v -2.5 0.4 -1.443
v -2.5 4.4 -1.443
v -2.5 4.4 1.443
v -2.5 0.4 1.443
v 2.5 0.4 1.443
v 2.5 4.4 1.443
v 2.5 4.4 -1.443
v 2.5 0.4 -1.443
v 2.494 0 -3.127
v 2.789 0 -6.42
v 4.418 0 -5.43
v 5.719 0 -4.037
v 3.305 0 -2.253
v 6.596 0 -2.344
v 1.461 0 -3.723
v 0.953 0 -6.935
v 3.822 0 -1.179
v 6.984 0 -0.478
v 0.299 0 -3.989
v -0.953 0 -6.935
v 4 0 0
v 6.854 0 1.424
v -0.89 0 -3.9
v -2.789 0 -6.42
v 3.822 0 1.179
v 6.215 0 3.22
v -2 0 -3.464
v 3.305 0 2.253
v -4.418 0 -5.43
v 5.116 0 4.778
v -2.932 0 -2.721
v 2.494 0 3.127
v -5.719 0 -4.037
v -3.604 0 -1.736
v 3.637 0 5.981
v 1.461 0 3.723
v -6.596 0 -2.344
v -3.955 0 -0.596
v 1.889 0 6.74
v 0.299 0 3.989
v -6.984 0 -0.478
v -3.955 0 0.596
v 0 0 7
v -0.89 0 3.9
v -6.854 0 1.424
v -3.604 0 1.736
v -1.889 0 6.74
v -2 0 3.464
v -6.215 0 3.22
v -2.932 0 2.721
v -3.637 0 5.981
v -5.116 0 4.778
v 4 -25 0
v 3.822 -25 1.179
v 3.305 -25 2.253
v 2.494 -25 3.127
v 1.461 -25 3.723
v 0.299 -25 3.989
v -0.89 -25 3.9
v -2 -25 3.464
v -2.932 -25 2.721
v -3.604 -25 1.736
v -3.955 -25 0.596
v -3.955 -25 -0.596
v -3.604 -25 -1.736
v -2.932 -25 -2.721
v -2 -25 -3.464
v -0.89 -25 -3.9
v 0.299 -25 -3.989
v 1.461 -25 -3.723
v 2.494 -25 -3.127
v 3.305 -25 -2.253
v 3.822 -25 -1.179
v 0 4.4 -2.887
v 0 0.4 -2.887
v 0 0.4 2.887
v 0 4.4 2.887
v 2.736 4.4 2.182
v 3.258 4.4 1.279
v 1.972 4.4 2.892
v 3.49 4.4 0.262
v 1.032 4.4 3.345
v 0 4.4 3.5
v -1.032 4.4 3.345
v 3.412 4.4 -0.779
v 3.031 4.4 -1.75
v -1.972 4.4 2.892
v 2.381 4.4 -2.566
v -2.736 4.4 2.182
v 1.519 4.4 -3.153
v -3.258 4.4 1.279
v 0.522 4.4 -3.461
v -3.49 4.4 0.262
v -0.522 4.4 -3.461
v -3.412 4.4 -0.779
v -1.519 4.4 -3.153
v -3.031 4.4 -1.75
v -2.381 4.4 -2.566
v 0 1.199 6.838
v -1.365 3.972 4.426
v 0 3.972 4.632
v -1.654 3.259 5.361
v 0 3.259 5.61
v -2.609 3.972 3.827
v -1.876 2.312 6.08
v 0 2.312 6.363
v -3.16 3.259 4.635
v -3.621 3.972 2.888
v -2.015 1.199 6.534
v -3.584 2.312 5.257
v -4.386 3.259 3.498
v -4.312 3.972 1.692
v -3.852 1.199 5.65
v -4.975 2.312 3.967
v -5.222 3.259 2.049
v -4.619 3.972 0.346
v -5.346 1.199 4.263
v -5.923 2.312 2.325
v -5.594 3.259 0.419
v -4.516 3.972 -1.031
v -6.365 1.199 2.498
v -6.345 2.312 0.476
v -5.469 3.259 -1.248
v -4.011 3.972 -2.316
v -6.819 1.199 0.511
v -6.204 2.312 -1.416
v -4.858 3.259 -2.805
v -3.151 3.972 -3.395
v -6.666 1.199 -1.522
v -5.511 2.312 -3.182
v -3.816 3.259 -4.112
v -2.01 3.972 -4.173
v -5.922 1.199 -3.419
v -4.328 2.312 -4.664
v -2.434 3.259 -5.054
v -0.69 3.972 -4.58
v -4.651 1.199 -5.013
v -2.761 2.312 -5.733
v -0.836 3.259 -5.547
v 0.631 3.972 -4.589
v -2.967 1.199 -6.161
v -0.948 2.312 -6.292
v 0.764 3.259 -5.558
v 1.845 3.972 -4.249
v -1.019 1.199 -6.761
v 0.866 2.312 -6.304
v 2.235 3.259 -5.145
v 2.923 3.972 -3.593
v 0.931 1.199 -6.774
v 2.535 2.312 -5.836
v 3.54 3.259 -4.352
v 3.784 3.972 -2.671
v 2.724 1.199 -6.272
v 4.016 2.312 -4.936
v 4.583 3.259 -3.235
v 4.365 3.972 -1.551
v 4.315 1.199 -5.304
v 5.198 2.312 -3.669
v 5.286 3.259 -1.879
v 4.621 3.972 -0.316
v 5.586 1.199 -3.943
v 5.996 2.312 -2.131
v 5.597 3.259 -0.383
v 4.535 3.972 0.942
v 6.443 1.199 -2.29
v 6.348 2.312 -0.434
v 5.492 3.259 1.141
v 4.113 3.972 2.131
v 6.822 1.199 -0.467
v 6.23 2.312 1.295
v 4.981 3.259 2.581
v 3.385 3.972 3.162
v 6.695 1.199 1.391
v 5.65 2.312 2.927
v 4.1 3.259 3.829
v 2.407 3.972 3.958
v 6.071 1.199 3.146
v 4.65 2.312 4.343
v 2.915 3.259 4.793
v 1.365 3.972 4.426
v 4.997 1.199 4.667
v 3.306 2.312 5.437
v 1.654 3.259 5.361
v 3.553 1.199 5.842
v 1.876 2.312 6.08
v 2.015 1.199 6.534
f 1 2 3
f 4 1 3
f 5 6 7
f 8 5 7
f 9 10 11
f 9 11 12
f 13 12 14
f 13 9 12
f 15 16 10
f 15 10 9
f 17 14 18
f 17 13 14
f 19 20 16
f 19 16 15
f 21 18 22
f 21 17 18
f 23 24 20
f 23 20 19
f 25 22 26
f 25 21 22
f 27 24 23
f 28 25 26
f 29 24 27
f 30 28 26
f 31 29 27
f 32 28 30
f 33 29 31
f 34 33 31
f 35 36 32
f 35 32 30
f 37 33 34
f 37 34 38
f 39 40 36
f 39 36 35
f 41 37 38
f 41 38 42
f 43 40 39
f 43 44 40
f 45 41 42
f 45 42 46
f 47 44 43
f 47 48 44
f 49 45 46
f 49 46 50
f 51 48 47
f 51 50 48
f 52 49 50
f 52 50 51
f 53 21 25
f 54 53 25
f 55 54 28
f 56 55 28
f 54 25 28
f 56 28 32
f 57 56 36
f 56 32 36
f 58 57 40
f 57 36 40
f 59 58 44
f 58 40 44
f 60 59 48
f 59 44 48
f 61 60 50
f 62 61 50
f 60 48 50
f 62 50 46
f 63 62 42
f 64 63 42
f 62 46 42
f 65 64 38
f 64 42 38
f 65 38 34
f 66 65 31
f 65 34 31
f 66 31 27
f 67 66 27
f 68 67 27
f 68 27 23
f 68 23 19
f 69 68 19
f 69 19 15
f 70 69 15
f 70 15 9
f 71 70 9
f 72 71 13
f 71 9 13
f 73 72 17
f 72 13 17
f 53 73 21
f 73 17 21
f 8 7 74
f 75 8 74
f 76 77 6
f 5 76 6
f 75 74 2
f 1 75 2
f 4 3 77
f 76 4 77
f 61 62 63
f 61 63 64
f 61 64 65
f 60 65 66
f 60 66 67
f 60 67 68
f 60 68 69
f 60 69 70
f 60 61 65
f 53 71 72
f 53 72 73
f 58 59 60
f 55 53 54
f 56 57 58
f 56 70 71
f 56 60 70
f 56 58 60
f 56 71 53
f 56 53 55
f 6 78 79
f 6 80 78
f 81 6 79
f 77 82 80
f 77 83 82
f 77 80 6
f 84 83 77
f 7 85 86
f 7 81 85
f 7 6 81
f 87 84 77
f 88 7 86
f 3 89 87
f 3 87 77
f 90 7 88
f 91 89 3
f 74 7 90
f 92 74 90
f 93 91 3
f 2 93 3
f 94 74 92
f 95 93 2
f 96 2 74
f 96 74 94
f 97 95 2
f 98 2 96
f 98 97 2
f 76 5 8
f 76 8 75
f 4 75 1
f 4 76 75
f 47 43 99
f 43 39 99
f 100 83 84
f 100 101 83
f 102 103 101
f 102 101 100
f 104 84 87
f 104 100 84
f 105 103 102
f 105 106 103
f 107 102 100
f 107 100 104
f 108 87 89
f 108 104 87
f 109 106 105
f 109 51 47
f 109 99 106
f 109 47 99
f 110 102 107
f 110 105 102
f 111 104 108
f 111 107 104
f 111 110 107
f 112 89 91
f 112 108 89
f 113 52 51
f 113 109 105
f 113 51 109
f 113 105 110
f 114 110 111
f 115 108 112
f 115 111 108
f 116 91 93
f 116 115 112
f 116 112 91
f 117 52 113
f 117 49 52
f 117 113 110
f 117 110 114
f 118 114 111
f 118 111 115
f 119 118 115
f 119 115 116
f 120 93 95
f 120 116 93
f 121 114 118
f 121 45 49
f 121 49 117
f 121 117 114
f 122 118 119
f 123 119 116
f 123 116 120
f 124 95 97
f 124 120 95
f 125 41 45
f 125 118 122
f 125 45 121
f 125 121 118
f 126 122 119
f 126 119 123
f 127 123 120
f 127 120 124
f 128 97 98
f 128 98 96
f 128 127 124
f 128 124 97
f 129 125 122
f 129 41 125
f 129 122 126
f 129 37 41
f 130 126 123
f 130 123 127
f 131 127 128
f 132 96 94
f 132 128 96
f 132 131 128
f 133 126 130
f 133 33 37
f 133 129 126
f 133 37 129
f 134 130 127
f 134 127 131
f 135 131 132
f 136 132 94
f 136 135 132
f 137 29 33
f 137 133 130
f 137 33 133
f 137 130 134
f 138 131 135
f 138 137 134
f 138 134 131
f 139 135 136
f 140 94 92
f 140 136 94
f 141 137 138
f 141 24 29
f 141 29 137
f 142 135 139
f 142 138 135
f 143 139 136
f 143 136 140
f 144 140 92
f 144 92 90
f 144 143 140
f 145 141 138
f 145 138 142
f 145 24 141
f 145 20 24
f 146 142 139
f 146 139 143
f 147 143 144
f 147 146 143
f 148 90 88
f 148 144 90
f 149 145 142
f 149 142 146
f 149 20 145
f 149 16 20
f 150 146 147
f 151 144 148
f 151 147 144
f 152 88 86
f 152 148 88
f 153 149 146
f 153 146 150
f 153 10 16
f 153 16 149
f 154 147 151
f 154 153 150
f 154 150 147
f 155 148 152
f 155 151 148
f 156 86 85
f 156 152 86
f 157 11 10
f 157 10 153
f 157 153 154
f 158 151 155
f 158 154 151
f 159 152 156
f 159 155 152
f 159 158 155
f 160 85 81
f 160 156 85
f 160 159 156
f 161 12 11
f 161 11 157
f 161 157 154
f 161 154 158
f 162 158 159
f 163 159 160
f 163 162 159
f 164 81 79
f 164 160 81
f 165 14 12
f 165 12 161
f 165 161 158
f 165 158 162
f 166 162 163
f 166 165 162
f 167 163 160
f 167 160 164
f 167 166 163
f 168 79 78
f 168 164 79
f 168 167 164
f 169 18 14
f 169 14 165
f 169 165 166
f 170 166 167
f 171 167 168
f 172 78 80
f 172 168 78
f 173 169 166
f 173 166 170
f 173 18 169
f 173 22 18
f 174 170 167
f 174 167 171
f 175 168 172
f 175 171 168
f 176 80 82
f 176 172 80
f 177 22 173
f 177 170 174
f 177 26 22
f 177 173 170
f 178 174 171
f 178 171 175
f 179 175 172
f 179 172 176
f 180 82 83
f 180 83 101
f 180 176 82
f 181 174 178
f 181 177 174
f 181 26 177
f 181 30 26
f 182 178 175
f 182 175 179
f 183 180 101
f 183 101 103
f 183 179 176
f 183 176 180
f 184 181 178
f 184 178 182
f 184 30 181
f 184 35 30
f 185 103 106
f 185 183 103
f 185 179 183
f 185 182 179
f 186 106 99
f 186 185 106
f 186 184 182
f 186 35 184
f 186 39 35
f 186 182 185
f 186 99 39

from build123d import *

# Parameters (mm, degrees)
F0_R     = 4
F1_DEPTH = 25
F5_DEPTH = 4


with BuildPart() as f1:
    # F0 (on Front) → F1 (new body)
    with BuildSketch(Plane.XZ):
        Circle(F0_R)
    extrude(amount=F1_DEPTH)

    # F2 (on Right) → F3 (revolve)
    with BuildSketch(Plane.YZ):
        with BuildLine():
            Line((0, 7), (0, 0))
            Line((0, 0), (4.4, 0))
            Line((4.4, 0), (4.4, 2.5))
            Line((4.4, 2.5), (4.4, 3.5))
            ThreePointArc((4.4, 3.5), (2.811139, 6.018288), (0, 7))
        make_face()
    revolve(axis=Axis((0, 0, 0), (0, -1, 0)))

    # F4 (on face) → F5 (cut)
    with BuildSketch(Plane(origin=(0, 4.4, 0), x_dir=(-1, 0, 0), z_dir=(0, 1, 0))):
        Polygon((-2.5, 1.443376), (-2.5, -1.443376), (0, -2.886751), (2.5, -1.443376), (2.5, 1.443376), (0, 2.886751), align=None)
    extrude(amount=-F5_DEPTH, mode=Mode.SUBTRACT)


solid = f1.part
